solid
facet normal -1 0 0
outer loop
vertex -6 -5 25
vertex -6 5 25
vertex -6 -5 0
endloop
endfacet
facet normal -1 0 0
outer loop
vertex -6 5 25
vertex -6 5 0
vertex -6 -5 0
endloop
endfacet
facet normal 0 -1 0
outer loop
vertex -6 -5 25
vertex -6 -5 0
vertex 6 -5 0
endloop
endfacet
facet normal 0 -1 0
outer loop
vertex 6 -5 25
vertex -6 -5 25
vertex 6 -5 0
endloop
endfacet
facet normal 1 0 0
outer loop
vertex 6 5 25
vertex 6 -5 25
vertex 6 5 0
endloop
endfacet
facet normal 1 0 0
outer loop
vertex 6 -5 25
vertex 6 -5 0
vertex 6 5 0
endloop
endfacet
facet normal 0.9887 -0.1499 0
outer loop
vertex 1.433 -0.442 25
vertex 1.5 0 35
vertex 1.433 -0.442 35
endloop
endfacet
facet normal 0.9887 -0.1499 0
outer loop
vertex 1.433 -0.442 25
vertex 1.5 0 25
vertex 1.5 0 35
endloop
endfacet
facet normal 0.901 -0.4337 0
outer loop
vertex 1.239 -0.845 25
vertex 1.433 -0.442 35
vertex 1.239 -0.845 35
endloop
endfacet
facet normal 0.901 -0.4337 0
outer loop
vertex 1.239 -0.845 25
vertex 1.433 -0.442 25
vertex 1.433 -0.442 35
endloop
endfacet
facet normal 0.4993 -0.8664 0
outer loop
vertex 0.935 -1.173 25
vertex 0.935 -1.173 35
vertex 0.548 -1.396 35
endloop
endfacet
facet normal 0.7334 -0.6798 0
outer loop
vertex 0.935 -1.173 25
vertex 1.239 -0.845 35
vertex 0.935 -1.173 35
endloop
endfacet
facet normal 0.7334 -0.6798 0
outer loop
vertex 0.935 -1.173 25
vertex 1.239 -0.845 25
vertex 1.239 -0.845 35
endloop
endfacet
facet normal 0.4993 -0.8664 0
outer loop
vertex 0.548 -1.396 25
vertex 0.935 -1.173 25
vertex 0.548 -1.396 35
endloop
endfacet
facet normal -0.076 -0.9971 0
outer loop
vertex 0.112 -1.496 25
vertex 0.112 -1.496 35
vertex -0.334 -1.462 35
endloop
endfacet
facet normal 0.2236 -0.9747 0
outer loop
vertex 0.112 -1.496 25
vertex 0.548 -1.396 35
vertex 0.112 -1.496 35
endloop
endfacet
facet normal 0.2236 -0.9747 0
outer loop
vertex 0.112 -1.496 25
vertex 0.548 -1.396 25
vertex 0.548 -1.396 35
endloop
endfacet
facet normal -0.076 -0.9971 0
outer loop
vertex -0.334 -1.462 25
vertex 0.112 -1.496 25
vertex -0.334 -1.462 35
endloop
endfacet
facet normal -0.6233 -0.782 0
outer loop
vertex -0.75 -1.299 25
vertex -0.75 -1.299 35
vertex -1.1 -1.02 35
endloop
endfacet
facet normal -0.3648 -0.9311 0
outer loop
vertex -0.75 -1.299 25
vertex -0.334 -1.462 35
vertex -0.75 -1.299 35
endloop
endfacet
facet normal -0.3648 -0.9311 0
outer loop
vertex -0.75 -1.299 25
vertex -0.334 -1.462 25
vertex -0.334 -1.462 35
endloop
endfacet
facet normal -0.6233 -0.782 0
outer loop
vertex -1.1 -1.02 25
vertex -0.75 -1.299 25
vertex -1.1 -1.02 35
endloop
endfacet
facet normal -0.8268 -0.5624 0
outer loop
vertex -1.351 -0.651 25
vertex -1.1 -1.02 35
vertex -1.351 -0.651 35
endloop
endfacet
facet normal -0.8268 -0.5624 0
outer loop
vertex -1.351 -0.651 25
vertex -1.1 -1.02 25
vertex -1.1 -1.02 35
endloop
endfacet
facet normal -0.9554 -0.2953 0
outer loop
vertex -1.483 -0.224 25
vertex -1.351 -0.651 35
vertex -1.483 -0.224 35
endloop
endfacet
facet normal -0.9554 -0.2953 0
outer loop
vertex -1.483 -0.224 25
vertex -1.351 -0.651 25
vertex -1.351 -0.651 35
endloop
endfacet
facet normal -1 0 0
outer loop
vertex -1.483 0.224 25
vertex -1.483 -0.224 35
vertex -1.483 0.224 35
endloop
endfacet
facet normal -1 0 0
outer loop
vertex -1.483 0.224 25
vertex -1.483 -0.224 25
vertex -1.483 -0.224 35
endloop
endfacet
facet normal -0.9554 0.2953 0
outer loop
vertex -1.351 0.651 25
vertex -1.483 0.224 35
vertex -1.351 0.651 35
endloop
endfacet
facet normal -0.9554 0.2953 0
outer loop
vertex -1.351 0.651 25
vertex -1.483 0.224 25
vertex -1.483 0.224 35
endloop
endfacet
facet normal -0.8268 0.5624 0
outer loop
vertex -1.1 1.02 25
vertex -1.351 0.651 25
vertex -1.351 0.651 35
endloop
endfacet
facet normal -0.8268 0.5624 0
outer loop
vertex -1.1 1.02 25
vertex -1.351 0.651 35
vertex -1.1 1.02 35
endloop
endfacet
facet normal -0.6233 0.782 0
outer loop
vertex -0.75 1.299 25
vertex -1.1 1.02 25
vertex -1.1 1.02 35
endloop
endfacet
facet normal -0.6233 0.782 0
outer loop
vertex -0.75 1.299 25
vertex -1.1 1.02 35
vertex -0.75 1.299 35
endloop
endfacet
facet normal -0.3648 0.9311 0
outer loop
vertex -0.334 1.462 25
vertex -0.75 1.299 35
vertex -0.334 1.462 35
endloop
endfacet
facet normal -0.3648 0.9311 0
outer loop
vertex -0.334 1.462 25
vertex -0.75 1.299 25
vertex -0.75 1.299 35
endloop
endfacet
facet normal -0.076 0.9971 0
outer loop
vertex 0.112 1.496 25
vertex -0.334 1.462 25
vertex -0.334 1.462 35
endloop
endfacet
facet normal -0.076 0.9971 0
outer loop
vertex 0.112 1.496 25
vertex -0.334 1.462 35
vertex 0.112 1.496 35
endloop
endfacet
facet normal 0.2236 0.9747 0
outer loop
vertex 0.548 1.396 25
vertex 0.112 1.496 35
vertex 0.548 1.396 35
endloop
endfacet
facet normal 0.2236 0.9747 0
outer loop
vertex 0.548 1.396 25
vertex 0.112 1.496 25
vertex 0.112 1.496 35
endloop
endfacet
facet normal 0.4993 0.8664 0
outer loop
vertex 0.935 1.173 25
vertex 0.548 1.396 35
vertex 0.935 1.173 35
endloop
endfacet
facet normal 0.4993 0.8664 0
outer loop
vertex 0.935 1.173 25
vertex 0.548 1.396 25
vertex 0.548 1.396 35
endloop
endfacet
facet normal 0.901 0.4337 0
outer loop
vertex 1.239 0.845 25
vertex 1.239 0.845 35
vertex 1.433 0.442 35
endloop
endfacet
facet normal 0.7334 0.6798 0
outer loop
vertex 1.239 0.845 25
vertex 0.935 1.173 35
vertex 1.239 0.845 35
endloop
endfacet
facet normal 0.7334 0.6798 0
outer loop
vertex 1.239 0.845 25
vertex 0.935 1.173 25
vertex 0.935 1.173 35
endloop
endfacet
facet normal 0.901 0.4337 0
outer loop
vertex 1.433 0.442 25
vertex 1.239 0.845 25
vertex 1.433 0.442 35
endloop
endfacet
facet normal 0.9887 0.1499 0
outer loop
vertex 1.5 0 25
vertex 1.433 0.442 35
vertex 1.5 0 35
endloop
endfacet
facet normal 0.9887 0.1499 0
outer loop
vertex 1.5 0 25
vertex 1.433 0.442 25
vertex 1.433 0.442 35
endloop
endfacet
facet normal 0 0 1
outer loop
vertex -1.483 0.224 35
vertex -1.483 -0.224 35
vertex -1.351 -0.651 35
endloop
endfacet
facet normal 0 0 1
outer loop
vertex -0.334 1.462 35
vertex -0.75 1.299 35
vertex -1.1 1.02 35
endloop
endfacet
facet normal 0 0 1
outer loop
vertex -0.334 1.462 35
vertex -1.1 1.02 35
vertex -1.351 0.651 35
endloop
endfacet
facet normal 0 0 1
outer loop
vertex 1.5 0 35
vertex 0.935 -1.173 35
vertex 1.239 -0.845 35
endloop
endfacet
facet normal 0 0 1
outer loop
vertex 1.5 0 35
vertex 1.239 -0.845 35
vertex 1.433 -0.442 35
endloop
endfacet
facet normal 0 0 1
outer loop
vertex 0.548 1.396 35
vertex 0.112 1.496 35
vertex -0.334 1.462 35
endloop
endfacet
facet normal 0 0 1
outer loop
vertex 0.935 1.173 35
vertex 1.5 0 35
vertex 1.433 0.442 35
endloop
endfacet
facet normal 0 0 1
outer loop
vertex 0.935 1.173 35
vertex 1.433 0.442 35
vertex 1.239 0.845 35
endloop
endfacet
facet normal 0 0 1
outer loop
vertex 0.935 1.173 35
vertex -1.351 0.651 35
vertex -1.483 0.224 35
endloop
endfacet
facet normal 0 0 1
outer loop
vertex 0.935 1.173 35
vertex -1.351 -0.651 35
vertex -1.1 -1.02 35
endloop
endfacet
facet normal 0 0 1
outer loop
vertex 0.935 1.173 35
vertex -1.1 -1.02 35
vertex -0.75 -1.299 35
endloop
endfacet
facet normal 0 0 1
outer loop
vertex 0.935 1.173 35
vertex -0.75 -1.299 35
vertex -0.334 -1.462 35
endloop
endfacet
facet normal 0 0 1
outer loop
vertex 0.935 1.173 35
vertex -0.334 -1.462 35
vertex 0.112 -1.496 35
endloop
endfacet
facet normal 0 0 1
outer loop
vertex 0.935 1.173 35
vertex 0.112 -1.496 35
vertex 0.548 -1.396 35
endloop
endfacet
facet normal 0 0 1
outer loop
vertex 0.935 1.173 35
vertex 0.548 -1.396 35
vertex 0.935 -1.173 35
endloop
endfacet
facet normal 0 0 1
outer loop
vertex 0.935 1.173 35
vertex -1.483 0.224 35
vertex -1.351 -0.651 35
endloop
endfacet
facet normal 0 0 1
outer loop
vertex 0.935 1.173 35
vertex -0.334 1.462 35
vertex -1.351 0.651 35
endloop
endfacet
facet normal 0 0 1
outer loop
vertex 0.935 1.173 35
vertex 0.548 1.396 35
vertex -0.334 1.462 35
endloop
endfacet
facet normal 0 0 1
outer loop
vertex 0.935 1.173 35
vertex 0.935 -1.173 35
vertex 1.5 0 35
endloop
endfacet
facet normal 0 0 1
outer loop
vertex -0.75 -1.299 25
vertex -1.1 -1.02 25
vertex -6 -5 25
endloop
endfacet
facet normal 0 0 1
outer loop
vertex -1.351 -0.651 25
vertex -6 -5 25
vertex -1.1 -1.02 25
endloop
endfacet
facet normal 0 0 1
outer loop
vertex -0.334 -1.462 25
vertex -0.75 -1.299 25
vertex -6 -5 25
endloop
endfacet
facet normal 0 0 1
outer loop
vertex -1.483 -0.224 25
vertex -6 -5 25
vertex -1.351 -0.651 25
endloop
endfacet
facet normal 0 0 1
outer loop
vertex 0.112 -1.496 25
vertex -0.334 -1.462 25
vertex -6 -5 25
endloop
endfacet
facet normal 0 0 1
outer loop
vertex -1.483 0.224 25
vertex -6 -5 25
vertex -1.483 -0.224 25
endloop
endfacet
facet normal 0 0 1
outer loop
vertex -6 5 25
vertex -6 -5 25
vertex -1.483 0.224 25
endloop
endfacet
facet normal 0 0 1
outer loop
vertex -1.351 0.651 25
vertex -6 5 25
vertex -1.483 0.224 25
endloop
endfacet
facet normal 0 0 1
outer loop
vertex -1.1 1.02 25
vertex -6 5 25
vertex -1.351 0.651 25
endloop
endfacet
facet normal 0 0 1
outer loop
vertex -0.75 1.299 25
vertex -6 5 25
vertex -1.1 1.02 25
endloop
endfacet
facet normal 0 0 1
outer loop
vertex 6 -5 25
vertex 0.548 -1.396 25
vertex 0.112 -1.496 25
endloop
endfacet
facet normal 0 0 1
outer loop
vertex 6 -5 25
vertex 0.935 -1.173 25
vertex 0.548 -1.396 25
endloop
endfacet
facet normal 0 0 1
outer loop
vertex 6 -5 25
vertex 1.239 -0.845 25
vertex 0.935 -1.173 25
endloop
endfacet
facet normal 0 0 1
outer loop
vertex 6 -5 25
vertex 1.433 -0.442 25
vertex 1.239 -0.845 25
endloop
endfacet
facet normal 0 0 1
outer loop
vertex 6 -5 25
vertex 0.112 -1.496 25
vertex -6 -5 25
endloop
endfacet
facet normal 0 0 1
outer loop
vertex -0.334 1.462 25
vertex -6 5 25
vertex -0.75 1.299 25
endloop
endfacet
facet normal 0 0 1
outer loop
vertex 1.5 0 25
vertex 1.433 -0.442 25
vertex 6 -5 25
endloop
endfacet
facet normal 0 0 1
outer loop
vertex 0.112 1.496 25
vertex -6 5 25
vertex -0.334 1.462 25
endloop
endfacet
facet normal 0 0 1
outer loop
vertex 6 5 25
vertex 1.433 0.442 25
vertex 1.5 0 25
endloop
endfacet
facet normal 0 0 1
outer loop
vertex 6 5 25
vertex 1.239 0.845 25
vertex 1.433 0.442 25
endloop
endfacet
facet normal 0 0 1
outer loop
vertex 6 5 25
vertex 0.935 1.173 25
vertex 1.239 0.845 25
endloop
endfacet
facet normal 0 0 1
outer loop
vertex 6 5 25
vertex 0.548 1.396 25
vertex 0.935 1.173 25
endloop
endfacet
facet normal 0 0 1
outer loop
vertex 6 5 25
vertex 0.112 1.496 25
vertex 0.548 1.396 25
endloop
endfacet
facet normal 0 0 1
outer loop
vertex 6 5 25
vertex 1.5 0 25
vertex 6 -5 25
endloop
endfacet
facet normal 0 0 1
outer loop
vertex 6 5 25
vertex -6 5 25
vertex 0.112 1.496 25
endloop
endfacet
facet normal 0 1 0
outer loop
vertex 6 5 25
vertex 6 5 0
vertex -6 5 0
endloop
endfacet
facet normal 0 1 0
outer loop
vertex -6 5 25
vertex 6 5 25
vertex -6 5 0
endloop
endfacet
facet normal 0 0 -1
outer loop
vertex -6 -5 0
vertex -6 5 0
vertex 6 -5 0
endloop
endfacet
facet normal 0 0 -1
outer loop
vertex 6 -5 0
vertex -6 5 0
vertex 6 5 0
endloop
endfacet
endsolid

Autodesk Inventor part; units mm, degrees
ref_plane "YZ Plane" through (0, 0, 0) normal (1, 0, 0) x (0, 1, 0)
ref_plane "XZ Plane" through (0, 0, 0) normal (0, 1, 0) x (-1, 0, 0)
ref_plane "XY Plane" through (0, 0, 0) normal (0, 0, 1) x (1, 0, 0)
sketch "Náčrt1" plane through (0, 0, 0) normal (0, 0, 1) x (1, 0, 0)
  line L0 (-6, -5) -> (6, -5)
  line L1 (6, -5) -> (6, 5)
  line L2 (6, 5) -> (-6, 5)
  line L3 (-6, 5) -> (-6, -5)
  point P0 (0, 0)
  dimension "d2" = 12
  dimension "d3" = 10
  dimension "d4" = 6
  dimension "d5" = 5
extrude "Vysunutí1" add sketch "Náčrt1" along normal blind 25
sketch "Náčrt2" plane through (0, 0, 25) normal (0, 0, 1) x (1, 0, 0)
  circle A0 centre (0, 0) radius 1.5
  dimension "d8" = 3
extrude "Vysunutí2" add sketch "Náčrt2" along normal blind 10
properties part number "motor GA12-N20 12V s převodovkou"
